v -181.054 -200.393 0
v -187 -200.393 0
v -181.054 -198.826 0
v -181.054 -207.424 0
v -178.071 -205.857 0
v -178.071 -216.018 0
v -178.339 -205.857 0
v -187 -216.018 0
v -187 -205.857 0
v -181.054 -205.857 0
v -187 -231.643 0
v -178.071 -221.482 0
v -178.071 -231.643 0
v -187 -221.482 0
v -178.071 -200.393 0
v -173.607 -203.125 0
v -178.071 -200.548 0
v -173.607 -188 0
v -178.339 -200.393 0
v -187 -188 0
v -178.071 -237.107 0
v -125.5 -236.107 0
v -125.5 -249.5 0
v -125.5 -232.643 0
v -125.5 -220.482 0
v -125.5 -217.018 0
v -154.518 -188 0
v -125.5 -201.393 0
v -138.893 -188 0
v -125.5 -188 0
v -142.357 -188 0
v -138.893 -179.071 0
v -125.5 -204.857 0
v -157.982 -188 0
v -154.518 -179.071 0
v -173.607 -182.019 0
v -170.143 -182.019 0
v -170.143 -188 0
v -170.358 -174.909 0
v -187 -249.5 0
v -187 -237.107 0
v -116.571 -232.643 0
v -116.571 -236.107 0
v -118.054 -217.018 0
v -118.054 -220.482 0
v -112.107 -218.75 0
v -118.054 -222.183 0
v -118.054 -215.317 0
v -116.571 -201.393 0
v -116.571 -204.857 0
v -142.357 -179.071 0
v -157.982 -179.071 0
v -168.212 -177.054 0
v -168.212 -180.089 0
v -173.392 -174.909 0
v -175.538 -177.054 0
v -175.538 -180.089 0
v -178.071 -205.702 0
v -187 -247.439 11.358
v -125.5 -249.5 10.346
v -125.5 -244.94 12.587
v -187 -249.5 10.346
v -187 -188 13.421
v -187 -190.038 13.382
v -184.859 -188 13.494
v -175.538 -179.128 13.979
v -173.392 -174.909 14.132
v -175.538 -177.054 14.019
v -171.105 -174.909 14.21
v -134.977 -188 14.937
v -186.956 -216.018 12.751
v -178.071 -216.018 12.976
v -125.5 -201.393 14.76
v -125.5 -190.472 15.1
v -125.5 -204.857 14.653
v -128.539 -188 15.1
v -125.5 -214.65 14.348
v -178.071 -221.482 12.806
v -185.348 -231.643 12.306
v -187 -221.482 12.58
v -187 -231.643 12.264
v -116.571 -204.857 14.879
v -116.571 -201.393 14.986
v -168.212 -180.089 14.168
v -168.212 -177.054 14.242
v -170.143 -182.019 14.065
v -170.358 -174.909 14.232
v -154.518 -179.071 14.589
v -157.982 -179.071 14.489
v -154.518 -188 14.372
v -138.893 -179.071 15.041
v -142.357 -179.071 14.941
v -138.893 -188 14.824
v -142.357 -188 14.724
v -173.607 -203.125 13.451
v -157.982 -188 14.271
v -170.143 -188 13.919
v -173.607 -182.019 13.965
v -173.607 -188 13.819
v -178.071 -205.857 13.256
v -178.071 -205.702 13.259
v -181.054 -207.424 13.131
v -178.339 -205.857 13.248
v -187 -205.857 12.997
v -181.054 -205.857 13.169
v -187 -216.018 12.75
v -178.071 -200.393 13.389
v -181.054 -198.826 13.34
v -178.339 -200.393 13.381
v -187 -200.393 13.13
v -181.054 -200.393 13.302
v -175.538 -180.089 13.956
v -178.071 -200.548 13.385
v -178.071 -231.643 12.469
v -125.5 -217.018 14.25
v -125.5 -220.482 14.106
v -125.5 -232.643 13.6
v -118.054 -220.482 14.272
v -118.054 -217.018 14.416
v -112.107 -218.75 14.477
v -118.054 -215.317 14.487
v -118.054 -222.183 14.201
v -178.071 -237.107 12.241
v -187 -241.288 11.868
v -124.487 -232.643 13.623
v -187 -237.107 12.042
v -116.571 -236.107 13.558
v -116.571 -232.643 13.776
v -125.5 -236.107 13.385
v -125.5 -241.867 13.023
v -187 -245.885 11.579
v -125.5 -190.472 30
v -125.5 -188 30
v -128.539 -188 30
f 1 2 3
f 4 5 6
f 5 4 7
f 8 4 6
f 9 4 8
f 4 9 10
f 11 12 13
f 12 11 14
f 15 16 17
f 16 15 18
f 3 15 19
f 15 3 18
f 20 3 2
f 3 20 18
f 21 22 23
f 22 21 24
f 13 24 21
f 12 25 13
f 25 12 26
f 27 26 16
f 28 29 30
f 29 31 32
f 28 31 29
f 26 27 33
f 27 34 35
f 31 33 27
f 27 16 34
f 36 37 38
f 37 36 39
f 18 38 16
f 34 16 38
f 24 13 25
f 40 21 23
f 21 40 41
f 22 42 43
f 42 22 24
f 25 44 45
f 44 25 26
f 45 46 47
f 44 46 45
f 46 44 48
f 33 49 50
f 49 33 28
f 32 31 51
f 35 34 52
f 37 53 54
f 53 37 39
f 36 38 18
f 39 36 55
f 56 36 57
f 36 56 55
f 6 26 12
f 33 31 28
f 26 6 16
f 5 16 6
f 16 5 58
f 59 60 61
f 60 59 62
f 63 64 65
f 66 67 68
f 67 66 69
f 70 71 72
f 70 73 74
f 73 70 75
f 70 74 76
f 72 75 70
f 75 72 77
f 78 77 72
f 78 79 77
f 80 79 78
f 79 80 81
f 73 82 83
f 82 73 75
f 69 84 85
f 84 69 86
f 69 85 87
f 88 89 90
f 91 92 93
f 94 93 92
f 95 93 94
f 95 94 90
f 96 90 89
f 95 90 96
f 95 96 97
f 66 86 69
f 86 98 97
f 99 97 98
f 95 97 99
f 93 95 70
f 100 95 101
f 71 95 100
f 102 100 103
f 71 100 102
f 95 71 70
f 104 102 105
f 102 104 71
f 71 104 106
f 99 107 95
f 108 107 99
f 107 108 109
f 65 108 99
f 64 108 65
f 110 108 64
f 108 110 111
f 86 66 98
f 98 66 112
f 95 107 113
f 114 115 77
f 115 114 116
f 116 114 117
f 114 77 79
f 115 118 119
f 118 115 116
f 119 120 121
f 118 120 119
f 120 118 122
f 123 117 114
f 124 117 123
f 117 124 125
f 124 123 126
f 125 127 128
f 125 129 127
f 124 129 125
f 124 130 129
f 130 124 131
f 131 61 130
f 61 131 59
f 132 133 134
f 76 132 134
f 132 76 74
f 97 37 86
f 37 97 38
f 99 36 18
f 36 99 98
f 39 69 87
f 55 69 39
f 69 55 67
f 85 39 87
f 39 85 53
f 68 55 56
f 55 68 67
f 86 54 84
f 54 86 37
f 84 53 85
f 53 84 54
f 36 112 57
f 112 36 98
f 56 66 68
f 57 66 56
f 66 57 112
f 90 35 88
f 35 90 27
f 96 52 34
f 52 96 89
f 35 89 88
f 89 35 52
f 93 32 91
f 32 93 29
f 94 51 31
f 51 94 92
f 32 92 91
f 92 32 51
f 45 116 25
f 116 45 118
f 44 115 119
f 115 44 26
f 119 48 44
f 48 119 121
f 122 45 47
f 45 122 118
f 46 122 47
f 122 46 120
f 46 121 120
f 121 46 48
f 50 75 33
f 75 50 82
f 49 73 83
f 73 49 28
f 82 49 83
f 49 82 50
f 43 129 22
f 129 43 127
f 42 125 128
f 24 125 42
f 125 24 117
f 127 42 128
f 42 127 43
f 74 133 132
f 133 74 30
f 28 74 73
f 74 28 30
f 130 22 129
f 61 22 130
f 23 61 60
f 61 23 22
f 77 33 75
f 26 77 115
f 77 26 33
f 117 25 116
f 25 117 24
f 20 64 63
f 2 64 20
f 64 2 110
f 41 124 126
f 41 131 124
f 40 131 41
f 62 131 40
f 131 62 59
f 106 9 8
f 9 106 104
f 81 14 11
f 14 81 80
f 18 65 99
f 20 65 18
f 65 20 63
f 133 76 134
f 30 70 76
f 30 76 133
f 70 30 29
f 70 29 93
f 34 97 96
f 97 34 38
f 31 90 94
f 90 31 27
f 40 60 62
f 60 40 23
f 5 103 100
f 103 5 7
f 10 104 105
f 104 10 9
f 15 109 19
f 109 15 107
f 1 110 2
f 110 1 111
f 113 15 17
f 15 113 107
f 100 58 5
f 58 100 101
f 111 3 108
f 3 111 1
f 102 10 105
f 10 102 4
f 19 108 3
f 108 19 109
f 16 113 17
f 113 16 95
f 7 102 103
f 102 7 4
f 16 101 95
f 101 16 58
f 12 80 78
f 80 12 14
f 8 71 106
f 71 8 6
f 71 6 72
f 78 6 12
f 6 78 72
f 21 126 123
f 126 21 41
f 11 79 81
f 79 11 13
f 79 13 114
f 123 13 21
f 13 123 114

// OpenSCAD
/*
*
* MakeMunich2013 Puzzle
*
*
* 2013-04-5 by Bernhard Slawik
* http://www.bernhardslawik.de, http://www.objektdruckerei.de
*
*/
use <makeMunichLogo.inc.scad>

// General configuration
EPS = 0.1;		// Eps(ilon) for floating point inprecisions
PREVIEW = true;	// Preview shows the borders and reduces quality
FN = (PREVIEW ? 8 : 32);	// Quality of round edges

// Size configuration
w = 500.0;		// Width of whole puzzle in millimeters
h = 500.0;		// Height of whole puzzle in millimeters
thick = 30.0;	// Thickness of one piece
baseThick = 10.0;	// Height/thickness of base
slantThick = 10.0;
space = 0.5;		// Spacing ON EACH EDGE

logoScale = h/120.0;	// Depends on how big the logo has been created


// Puzzle configuration
piecesX = 8;
piecesY = 8;

// Which part to render?
renderX = 1;
renderY = 0;


pieceW = w/piecesX;
pieceH = h/piecesY;

echo(str("Pieces are ", pieceW, " x ", pieceH, " mm each"));
if (PREVIEW) {
	echo("CAUTION!! You are currently rendering in PREVIEW (Draft) quality! Set variable 'PREVIEW' to false to generate high-res printable model!");
}

conBits = 3;
conDiam = min(pieceW, pieceH) / (conBits*2+1);
conSpace = min(pieceW, pieceH) / (conBits+1);
conNeck = conDiam;
conNeckDiam = conDiam/2;


// Implementation

function testBit_internal(rest, bit, i) =
	(i < 0) ? false :
	(rest >= pow(2, i)) ? (
		(i == bit) ? true :
		testBit_internal(rest - pow(2, i), bit, i-1)
	) :
		(i == bit) ? false :
		testBit_internal(rest, bit, i-1)
	;

// Check if the given bit is set in given code
function testBit(code, bit) =
	testBit_internal(code, bit, conBits-1);


module connector(code, kind=0, extra=0, extraT=0) {
	if (code >= 0)
	for (i=[0:conBits-1])
		translate([conSpace + i*conSpace, 0, 0]) {

			// EVERY thing has a connector
			translate([-conNeckDiam/2 - extra, -(EPS + space), -extraT])
			cube([conNeckDiam + 2*extra, EPS + conNeck + space + extra, thick + 2*extraT]);

			if (testBit(code, i)) {
				translate([0, conNeck, -extraT])
				if (kind == 0)
					rotate([0, 0, 180/8])
					cylinder(r=conDiam/2 + extra, h=thick+2*extraT, $fn=8);
				else
					rotate([0, 0, 180+90/3])
					cylinder(r=conDiam/2 + extra, h=thick+2*extraT, $fn=3);
			}
		}
}


// Draw one puzzle piece base shape
module piece(codeUp=0, codeDown=0, codeLeft=0, codeRight=0, space=space) {
	difference() {
		union() {
			translate([space, space, 0])
			cube([pieceW - space*2, pieceH - space*2, thick]);
	
			translate([pieceW*0, pieceH])
			connector(codeUp, kind=0, extra=-space);
	
			translate([pieceW, pieceH])
			rotate([0,0,-90])
			connector(codeRight, kind=1, extra=-space);
		}

		union() {
			translate([pieceW*0, pieceH*0])
			connector(codeDown, kind=0, extra=space, extraT=EPS);
	
			translate([pieceW*0, pieceH])
			rotate([0,0,-90])
			connector(codeLeft, kind=1, extra=space, extraT=EPS);
		}
	}
/*
	translate([pieceW, pieceH])
	rotate([0,0,-90])
	connector(code);
*/
}

// Draw all puzzle pieces' base shapes (use it for intersecting a 3D model)

module piece_single(x, y) {
	translate([-w/2, -h/2, 0])
	translate([x*pieceW, y*pieceH, 0])
	piece(
		codeUp = (y >= piecesY-1 ? -1 : y+1),
		codeDown = (y <= 0 ? -1 : y),
		codeLeft = (x <= 0 ? -1 : x),
		codeRight = (x >= piecesX-1 ? -1 : x+1),
		space=space
	);
}

module pieces() {
	for(y=[0:piecesY-1])
	for(x=[0:piecesX-1])
	piece_single(x, y);
}


// Draw the logo in 3D
module logo() {

	if (PREVIEW) {
		* //Disabled
		// Show bounds
		%translate([-w/2, -h/2, 0])
		cube([w, h, thick]);
	}


	// Base
	translate([-w/2, -h/2, 0])
	cube([w, h, baseThick]);



	// Add some nice bevel
	hull() {
		translate([-w/2, -h/2, baseThick])
		cube([w, h, EPS]);

		translate([0, 0, baseThick + slantThick/2])
		linear_extrude(height=EPS)
		scale(logoScale)
		mmLogo(preview=PREVIEW);
	}


	// Extrude logo
	translate([0, 0, EPS])
	linear_extrude(height=thick-EPS)
	scale(logoScale)
	mmLogo(preview=PREVIEW);
}


// Combine logo and pieces to create 3D puzzle pieces
//logo();
//piece(1*1 + 0*2 + 1*4 + 0*8 + 1*16 + 0*32 + 1*64 + 0*128);
//pieces();


// Render one piece
echo(str("Rendering puzzle piece x=", renderX, "/", piecesX, ", y=", renderY, "/", piecesY, " ..."));


if ((renderX >= 0) && (renderX < piecesX) && (renderY >= 0) && (renderY < piecesY)) {
	intersection() {
		logo();
	
		piece_single(x=renderX, y=renderY);
	}
} else {
	echo("The given coordinates are out of range!");
}
